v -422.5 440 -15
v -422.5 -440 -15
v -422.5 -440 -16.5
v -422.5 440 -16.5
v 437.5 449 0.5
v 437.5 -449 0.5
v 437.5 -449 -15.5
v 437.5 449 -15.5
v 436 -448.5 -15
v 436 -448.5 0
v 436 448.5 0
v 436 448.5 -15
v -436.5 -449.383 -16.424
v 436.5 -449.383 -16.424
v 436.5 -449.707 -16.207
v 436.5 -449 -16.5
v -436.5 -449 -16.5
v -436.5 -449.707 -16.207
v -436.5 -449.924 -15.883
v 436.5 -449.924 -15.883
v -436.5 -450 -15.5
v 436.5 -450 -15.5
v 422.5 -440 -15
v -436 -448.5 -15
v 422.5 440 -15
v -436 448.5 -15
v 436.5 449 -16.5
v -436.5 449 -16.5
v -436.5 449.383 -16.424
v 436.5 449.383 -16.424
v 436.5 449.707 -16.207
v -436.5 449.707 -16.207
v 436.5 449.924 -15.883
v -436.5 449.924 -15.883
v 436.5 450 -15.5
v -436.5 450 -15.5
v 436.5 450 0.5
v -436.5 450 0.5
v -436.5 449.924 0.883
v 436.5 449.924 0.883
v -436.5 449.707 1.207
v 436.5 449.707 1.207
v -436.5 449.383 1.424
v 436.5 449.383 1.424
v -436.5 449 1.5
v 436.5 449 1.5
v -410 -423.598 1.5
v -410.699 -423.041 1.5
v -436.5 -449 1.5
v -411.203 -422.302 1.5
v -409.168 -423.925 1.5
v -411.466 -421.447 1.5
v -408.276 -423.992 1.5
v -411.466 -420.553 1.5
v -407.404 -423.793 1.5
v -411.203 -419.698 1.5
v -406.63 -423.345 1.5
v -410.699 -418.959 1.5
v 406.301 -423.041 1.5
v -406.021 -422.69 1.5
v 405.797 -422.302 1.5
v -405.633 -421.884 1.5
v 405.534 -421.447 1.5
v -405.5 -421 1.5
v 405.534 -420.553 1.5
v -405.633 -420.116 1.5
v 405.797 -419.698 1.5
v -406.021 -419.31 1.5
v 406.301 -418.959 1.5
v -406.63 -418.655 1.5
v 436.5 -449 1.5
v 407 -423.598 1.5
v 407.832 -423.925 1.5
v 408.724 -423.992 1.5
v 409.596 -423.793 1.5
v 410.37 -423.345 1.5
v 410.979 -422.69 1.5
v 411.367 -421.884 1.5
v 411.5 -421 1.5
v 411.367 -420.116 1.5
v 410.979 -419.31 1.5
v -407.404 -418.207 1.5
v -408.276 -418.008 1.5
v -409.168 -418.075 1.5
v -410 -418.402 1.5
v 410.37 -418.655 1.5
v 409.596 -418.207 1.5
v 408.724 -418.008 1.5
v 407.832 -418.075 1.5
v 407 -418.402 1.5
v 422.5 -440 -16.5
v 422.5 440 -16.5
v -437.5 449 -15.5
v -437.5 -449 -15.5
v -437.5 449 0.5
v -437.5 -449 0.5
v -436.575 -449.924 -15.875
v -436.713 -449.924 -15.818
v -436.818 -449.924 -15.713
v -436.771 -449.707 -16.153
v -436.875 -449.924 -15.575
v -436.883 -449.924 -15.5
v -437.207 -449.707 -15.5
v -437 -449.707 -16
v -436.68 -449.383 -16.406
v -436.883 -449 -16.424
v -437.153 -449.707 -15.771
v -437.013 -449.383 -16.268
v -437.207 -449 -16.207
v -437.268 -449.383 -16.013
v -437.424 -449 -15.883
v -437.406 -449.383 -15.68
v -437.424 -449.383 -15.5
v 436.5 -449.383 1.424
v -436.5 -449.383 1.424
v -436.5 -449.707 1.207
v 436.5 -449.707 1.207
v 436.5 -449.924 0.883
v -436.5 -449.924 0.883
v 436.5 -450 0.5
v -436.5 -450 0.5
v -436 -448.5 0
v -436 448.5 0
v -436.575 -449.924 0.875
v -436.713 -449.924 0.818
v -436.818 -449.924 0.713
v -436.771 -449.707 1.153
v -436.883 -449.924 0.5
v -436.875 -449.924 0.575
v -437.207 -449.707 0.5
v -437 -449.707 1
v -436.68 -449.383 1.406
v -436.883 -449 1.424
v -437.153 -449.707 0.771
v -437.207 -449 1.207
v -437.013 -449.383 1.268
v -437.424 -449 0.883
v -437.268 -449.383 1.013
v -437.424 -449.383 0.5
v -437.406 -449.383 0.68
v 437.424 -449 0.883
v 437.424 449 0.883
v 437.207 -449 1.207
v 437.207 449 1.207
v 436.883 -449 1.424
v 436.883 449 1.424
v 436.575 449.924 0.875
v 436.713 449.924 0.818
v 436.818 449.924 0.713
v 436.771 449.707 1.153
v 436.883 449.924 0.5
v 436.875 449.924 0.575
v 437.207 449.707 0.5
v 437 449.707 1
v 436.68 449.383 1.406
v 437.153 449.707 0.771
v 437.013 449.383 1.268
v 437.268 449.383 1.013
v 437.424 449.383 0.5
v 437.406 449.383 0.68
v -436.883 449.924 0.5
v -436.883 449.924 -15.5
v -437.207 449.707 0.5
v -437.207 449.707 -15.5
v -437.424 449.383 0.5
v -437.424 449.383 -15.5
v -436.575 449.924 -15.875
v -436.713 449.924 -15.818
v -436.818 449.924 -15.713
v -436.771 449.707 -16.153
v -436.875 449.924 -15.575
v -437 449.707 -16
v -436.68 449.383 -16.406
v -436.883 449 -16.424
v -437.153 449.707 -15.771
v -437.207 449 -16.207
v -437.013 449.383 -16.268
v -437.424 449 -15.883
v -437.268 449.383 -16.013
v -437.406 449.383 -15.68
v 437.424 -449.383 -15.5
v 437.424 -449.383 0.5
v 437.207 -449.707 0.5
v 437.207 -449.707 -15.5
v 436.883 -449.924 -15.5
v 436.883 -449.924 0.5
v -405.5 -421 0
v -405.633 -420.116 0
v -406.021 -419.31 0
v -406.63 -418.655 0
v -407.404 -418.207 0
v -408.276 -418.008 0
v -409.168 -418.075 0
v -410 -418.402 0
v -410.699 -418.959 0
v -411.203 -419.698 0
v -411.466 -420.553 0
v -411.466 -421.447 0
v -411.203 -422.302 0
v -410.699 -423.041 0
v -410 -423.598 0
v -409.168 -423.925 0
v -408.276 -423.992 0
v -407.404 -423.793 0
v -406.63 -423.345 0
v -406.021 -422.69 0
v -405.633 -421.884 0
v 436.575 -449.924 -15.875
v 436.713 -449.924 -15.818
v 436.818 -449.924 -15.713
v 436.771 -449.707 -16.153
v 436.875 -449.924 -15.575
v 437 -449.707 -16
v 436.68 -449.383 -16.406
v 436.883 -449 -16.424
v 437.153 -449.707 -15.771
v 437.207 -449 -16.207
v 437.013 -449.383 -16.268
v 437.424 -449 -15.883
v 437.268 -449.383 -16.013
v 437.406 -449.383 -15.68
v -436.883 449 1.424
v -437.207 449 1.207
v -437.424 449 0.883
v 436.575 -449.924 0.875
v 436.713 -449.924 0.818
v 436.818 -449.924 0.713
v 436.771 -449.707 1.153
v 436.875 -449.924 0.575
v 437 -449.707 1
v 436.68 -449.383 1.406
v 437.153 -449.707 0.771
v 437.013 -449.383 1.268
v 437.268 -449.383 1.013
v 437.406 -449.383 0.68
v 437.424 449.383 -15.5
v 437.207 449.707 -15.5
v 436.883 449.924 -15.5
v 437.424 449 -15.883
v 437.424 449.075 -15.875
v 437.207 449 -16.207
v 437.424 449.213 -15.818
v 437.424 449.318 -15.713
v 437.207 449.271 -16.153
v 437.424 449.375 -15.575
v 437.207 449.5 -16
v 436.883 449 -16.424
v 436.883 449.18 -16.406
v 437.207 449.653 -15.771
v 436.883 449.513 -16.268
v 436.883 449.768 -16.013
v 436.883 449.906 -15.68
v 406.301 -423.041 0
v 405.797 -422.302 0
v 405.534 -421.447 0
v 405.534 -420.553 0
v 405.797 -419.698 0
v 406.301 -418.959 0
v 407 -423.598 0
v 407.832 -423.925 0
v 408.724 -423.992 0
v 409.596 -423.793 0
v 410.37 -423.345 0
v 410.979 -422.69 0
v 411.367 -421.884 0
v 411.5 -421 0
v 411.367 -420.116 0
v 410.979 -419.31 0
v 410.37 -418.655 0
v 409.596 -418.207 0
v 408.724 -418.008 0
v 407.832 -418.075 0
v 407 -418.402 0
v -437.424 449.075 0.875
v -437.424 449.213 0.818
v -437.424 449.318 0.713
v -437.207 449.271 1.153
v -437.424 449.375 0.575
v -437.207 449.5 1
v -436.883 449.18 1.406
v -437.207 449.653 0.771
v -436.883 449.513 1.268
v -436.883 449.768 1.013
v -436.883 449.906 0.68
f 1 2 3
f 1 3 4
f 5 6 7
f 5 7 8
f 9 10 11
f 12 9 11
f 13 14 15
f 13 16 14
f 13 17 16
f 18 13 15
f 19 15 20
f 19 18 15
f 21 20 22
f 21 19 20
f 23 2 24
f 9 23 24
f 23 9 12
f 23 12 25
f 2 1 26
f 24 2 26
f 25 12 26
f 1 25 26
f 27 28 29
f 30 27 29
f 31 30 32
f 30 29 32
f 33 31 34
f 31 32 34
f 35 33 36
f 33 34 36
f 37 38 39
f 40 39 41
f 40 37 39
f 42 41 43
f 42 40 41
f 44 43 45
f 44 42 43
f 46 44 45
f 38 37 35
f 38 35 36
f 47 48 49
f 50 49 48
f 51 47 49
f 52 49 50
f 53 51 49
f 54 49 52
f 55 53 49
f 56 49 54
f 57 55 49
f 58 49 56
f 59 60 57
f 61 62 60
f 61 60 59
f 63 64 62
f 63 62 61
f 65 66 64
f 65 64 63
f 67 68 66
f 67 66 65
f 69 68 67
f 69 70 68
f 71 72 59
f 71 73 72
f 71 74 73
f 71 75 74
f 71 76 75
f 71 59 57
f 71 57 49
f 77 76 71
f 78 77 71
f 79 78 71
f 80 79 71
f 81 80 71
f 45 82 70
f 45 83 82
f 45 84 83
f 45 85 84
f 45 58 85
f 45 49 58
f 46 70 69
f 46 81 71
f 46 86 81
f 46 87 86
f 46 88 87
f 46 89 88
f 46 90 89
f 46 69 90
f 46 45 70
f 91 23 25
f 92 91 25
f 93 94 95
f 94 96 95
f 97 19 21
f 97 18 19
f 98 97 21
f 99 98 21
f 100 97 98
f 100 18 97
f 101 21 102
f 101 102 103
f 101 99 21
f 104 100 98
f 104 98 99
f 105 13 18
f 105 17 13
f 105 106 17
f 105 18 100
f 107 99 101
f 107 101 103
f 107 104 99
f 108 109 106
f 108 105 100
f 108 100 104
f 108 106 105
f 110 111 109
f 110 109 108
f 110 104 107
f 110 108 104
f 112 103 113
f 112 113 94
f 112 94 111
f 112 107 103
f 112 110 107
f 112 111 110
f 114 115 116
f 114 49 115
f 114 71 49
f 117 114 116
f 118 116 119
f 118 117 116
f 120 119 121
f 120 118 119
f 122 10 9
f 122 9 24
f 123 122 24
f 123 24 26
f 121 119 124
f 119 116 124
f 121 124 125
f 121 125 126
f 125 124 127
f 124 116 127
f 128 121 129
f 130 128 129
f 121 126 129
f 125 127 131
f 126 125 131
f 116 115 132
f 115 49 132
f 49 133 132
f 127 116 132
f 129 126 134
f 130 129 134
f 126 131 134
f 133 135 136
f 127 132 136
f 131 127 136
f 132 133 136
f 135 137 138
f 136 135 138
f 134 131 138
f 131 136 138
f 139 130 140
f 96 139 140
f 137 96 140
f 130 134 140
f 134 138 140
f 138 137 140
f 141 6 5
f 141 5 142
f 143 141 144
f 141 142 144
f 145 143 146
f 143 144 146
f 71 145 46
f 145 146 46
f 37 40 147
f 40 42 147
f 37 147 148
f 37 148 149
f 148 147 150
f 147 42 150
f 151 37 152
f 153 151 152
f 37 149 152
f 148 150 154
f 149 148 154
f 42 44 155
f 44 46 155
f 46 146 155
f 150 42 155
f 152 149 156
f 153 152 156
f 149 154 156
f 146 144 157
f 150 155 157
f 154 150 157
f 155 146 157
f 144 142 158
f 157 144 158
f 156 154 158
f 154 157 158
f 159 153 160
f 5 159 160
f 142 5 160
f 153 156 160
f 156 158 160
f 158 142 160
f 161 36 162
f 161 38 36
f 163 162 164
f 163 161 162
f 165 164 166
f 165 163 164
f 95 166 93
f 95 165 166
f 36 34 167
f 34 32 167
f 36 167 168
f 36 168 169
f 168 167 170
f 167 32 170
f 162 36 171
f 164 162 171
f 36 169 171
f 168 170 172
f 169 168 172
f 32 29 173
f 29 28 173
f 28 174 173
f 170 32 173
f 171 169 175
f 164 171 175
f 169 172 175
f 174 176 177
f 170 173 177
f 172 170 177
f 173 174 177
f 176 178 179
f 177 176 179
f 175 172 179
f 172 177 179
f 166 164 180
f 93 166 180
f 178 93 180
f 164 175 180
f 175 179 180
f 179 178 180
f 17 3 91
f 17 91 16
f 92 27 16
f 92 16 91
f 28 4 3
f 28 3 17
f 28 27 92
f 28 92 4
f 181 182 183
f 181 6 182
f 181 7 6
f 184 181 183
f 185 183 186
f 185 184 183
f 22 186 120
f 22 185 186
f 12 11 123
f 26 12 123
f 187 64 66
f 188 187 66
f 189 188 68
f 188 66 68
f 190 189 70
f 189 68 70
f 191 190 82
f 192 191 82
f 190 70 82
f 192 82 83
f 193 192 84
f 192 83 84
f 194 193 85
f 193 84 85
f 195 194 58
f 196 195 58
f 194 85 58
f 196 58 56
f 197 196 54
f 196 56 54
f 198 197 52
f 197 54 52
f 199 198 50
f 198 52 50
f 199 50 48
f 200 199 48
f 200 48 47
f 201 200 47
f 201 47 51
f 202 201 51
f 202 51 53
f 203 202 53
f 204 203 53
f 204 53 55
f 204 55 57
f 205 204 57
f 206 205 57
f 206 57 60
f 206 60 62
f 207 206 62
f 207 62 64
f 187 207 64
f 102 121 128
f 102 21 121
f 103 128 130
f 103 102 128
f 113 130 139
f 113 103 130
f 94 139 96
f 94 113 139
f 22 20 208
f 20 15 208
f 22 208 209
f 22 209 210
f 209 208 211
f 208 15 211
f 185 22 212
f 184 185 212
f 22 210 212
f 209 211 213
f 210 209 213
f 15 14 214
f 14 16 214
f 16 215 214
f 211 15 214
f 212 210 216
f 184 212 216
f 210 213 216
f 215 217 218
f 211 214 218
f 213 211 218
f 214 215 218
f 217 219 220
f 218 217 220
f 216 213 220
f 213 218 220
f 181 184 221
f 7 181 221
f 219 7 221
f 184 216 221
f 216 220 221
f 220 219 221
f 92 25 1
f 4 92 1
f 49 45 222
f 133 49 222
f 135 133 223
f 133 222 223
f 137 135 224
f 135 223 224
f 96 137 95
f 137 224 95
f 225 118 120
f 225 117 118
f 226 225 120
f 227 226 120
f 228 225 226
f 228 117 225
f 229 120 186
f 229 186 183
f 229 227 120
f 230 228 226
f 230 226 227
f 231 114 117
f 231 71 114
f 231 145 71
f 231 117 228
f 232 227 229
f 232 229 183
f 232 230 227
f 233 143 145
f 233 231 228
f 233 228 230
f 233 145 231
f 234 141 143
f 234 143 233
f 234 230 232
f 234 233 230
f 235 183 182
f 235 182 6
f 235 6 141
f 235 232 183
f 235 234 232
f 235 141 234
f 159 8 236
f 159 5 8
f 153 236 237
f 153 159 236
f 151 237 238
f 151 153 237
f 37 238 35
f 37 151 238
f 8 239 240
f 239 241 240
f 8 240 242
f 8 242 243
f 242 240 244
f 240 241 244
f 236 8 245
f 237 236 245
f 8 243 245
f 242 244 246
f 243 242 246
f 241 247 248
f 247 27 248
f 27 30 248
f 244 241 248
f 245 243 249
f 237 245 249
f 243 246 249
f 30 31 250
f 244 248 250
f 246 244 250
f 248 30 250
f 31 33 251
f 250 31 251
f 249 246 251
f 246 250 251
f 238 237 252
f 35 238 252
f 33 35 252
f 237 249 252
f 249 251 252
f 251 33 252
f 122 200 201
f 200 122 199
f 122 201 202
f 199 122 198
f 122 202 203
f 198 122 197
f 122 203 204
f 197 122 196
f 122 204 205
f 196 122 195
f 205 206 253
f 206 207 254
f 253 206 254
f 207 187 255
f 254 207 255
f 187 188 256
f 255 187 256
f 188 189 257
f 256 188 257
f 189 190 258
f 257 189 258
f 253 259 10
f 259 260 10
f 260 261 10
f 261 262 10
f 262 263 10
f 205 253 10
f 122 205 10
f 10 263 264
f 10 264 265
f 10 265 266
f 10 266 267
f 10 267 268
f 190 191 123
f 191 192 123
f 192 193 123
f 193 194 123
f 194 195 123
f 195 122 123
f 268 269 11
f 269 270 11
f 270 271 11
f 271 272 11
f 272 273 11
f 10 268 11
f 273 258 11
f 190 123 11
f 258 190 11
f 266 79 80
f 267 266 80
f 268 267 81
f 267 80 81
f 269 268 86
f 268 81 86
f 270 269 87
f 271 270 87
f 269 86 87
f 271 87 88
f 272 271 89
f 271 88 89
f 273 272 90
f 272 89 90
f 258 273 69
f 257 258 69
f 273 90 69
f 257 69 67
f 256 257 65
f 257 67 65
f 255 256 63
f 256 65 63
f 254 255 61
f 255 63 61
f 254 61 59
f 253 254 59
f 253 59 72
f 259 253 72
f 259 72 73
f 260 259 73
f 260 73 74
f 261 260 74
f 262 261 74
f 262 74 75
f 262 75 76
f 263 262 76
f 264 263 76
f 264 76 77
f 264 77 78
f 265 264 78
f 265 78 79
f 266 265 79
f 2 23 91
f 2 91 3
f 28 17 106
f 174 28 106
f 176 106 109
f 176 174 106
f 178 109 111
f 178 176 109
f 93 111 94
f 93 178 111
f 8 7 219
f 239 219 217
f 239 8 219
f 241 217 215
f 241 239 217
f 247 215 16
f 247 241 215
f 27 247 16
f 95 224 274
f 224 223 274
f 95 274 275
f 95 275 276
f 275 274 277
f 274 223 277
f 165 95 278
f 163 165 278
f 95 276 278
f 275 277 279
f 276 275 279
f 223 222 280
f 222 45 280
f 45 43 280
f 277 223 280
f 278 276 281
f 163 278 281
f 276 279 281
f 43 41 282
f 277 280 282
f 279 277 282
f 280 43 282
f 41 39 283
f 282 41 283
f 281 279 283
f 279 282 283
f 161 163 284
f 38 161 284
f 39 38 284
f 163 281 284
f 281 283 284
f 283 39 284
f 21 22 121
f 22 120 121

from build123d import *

# Parameters (mm, degrees)
SKETCH_1_W          = 875
SKETCH_1_H          = 900
EXTRUDE_1_DEPTH     = 1.5
SKETCH_2_W          = 875
SKETCH_2_H          = 900
SKETCH_2_W_2        = 872
SKETCH_2_H_2        = 897
EXTRUDE_2_DEPTH     = 15
SKETCH_3_W          = 875
SKETCH_3_H          = 900
SKETCH_3_W_2        = 845
SKETCH_3_H_2        = 880
EXTRUDE_3_DEPTH     = 1.5
SKETCH_6_R          = 3
CUT_EXTRUDE_1_DEPTH = 19
FILLET_1_R          = 1


with BuildPart() as part:
    # 草图1 → 凸台-拉伸1 (new body)
    with BuildSketch(Plane.XY):
        Rectangle(SKETCH_1_W, SKETCH_1_H)
    extrude(amount=EXTRUDE_1_DEPTH)

    # 草图2 → 凸台-拉伸2 (add)
    with BuildSketch(Plane(origin=(0, 0, 0), x_dir=(-1, 0, 0), z_dir=(0, 0, -1))):
        Rectangle(SKETCH_2_W, SKETCH_2_H)
        Rectangle(SKETCH_2_W_2, SKETCH_2_H_2, mode=Mode.SUBTRACT)
    extrude(amount=EXTRUDE_2_DEPTH)

    # 草图3 → 凸台-拉伸3 (add)
    with BuildSketch(Plane(origin=(0, 0, -15), x_dir=(-1, 0, 0), z_dir=(0, 0, -1))):
        Rectangle(SKETCH_3_W, SKETCH_3_H)
        Rectangle(SKETCH_3_W_2, SKETCH_3_H_2, mode=Mode.SUBTRACT)
    extrude(amount=EXTRUDE_3_DEPTH)

    # 草图6 → 切除-拉伸1 (cut, through all)
    with BuildSketch(Plane.XY.offset(1.5)):
        with Locations((-408.5, -421)):
            Circle(SKETCH_6_R)
        with Locations((408.5, -421)):
            Circle(SKETCH_6_R)
    extrude(amount=-CUT_EXTRUDE_1_DEPTH, mode=Mode.SUBTRACT)

    # 圆角1
    fillet_1_edges = [part.edges().sort_by_distance(p)[0] for p in [
        (437.5, 0, 1.5),
        (0, 450, 1.5),
        (-437.5, 0, -16.5),
        (0, 450, -16.5),
        (437.5, 0, -16.5),
        (0, -450, -16.5),
        (-437.5, 0, 1.5),
        (0, -450, 1.5),
        (-437.5, 450, -7.5),
        (437.5, 450, -7.5),
        (437.5, -450, -7.5),
        (-437.5, -450, -7.5),
    ]]
    fillet(fillet_1_edges, radius=FILLET_1_R)


solid = part.part
